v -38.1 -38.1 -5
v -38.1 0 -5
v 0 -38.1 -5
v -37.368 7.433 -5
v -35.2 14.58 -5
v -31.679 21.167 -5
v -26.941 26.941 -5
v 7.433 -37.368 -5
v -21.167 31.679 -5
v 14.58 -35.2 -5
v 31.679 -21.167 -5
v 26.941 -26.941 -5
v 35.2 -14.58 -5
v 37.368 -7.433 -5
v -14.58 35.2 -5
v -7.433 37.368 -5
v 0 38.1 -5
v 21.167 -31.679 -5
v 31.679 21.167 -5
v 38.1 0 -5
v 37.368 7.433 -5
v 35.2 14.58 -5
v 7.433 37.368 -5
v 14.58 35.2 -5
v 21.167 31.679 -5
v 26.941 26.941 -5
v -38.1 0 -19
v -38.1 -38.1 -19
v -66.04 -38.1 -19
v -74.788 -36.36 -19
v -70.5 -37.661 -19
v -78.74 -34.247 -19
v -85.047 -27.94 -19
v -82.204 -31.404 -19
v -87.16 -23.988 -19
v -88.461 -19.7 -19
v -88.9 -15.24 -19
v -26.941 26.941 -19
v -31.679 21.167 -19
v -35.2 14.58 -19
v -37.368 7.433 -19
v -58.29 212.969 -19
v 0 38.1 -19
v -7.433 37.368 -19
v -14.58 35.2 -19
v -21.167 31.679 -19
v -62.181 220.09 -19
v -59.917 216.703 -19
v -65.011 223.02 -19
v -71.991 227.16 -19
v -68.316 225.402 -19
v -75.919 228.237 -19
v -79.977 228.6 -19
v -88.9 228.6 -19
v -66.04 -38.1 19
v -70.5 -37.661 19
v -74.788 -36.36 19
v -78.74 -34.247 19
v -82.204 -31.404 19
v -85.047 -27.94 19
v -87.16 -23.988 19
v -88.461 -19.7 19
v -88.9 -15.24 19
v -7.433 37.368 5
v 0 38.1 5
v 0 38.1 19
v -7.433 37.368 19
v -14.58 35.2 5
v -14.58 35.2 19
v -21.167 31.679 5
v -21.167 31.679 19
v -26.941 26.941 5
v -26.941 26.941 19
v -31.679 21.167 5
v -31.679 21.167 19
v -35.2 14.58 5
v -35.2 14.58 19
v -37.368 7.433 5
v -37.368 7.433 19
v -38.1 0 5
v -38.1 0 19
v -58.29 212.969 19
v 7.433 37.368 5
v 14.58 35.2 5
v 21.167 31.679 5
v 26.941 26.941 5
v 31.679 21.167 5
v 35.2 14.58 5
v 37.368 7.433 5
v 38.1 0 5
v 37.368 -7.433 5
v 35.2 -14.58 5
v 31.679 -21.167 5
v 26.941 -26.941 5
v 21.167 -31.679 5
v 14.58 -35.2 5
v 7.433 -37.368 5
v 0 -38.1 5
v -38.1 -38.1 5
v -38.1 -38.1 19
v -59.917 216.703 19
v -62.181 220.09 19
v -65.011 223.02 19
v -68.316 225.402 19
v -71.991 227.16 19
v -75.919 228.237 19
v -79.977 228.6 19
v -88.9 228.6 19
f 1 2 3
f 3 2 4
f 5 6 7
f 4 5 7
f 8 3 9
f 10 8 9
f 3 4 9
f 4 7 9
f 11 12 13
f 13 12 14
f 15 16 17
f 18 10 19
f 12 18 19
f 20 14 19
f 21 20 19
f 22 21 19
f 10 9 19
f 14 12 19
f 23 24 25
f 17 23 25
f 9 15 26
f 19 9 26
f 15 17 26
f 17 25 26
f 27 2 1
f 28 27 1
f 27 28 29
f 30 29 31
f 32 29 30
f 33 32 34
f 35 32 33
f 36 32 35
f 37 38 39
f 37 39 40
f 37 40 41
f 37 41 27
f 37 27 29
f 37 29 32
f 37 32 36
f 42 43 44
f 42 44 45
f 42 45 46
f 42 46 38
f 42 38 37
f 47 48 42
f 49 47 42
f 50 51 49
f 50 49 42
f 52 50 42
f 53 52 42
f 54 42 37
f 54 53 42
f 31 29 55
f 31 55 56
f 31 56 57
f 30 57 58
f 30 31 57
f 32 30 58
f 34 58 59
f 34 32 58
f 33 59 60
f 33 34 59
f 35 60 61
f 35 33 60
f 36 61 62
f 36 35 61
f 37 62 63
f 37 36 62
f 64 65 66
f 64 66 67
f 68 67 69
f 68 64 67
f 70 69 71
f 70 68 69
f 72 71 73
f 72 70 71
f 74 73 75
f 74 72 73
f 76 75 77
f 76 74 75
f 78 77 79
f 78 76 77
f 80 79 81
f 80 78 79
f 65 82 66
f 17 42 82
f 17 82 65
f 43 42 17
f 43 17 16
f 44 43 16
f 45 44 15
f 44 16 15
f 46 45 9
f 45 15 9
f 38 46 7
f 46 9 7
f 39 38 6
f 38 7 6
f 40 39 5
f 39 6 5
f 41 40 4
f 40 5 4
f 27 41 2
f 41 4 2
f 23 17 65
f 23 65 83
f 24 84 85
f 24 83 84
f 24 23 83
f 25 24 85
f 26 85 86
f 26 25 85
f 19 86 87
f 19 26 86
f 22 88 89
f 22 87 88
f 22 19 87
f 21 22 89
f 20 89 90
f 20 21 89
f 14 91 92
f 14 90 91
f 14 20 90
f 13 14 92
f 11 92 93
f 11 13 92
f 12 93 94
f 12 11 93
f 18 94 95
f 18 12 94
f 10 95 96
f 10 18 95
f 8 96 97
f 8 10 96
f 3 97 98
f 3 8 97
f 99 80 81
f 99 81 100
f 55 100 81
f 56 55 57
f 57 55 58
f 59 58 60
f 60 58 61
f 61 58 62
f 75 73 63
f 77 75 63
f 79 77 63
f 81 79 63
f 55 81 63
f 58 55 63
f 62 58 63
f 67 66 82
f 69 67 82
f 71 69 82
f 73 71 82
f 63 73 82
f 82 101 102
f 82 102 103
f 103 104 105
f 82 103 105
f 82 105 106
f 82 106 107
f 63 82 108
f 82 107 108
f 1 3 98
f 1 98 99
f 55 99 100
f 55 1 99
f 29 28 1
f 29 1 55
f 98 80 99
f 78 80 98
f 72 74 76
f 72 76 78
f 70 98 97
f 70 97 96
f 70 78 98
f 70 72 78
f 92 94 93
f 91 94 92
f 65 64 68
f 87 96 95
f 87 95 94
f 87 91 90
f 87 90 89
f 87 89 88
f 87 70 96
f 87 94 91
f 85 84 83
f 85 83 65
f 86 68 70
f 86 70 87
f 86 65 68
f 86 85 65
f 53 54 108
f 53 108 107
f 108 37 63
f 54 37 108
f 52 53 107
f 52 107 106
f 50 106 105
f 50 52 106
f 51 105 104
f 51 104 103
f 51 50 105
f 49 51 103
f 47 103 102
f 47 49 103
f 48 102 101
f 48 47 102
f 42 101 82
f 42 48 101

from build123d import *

# Parameters (mm, degrees)
BOSS_EXTRUDE2_DEPTH      = 19
BOSS_EXTRUDE2_DEPTH_BACK = 19
CUT_EXTRUDE2_START       = -14
CUT_EXTRUDE2_DEPTH       = 14


with BuildPart() as part:
    # Sketch3 → Boss-Extrude2 (new, two sides: drawn at the far end of the back side and taken through both)
    with BuildSketch(Plane.XY.offset(-BOSS_EXTRUDE2_DEPTH_BACK)):
        with BuildLine():
            Line((0, -38.1), (-66.04, -38.1))
            ThreePointArc((-66.04, -38.1), (-82.204461018, -31.404461018), (-88.9, -15.24))
            Line((-88.9, -15.24), (-88.9, 228.6))
            Line((-88.9, 228.6), (-79.97655577, 228.6))
            ThreePointArc((-79.97655577, 228.6), (-66.610078663, 224.284996353), (-58.289655577, 212.968966731))
            Line((-58.289655577, 212.968966731), (0, 38.1))
            ThreePointArc((0, 38.1), (38.1, 0), (0, -38.1))
        make_face()
    extrude(amount=BOSS_EXTRUDE2_DEPTH + BOSS_EXTRUDE2_DEPTH_BACK)

    # Sketch5 → Cut-Extrude2 (cut)
    with BuildSketch(Plane.XY.offset(19).offset(CUT_EXTRUDE2_START)):
        with BuildLine():
            Line((-38.1, 0), (-38.1, -38.1))
            Line((-38.1, -38.1), (0, -38.1))
            ThreePointArc((0, -38.1), (26.940768363, 26.940768363), (-38.1, 0))
        make_face()
    cut_extrude2 = extrude(amount=CUT_EXTRUDE2_DEPTH, mode=Mode.SUBTRACT)

    # Mirror2: Cut-Extrude2 across plane
    add(cut_extrude2.mirror(Plane.XY), mode=Mode.SUBTRACT)


solid = part.part
